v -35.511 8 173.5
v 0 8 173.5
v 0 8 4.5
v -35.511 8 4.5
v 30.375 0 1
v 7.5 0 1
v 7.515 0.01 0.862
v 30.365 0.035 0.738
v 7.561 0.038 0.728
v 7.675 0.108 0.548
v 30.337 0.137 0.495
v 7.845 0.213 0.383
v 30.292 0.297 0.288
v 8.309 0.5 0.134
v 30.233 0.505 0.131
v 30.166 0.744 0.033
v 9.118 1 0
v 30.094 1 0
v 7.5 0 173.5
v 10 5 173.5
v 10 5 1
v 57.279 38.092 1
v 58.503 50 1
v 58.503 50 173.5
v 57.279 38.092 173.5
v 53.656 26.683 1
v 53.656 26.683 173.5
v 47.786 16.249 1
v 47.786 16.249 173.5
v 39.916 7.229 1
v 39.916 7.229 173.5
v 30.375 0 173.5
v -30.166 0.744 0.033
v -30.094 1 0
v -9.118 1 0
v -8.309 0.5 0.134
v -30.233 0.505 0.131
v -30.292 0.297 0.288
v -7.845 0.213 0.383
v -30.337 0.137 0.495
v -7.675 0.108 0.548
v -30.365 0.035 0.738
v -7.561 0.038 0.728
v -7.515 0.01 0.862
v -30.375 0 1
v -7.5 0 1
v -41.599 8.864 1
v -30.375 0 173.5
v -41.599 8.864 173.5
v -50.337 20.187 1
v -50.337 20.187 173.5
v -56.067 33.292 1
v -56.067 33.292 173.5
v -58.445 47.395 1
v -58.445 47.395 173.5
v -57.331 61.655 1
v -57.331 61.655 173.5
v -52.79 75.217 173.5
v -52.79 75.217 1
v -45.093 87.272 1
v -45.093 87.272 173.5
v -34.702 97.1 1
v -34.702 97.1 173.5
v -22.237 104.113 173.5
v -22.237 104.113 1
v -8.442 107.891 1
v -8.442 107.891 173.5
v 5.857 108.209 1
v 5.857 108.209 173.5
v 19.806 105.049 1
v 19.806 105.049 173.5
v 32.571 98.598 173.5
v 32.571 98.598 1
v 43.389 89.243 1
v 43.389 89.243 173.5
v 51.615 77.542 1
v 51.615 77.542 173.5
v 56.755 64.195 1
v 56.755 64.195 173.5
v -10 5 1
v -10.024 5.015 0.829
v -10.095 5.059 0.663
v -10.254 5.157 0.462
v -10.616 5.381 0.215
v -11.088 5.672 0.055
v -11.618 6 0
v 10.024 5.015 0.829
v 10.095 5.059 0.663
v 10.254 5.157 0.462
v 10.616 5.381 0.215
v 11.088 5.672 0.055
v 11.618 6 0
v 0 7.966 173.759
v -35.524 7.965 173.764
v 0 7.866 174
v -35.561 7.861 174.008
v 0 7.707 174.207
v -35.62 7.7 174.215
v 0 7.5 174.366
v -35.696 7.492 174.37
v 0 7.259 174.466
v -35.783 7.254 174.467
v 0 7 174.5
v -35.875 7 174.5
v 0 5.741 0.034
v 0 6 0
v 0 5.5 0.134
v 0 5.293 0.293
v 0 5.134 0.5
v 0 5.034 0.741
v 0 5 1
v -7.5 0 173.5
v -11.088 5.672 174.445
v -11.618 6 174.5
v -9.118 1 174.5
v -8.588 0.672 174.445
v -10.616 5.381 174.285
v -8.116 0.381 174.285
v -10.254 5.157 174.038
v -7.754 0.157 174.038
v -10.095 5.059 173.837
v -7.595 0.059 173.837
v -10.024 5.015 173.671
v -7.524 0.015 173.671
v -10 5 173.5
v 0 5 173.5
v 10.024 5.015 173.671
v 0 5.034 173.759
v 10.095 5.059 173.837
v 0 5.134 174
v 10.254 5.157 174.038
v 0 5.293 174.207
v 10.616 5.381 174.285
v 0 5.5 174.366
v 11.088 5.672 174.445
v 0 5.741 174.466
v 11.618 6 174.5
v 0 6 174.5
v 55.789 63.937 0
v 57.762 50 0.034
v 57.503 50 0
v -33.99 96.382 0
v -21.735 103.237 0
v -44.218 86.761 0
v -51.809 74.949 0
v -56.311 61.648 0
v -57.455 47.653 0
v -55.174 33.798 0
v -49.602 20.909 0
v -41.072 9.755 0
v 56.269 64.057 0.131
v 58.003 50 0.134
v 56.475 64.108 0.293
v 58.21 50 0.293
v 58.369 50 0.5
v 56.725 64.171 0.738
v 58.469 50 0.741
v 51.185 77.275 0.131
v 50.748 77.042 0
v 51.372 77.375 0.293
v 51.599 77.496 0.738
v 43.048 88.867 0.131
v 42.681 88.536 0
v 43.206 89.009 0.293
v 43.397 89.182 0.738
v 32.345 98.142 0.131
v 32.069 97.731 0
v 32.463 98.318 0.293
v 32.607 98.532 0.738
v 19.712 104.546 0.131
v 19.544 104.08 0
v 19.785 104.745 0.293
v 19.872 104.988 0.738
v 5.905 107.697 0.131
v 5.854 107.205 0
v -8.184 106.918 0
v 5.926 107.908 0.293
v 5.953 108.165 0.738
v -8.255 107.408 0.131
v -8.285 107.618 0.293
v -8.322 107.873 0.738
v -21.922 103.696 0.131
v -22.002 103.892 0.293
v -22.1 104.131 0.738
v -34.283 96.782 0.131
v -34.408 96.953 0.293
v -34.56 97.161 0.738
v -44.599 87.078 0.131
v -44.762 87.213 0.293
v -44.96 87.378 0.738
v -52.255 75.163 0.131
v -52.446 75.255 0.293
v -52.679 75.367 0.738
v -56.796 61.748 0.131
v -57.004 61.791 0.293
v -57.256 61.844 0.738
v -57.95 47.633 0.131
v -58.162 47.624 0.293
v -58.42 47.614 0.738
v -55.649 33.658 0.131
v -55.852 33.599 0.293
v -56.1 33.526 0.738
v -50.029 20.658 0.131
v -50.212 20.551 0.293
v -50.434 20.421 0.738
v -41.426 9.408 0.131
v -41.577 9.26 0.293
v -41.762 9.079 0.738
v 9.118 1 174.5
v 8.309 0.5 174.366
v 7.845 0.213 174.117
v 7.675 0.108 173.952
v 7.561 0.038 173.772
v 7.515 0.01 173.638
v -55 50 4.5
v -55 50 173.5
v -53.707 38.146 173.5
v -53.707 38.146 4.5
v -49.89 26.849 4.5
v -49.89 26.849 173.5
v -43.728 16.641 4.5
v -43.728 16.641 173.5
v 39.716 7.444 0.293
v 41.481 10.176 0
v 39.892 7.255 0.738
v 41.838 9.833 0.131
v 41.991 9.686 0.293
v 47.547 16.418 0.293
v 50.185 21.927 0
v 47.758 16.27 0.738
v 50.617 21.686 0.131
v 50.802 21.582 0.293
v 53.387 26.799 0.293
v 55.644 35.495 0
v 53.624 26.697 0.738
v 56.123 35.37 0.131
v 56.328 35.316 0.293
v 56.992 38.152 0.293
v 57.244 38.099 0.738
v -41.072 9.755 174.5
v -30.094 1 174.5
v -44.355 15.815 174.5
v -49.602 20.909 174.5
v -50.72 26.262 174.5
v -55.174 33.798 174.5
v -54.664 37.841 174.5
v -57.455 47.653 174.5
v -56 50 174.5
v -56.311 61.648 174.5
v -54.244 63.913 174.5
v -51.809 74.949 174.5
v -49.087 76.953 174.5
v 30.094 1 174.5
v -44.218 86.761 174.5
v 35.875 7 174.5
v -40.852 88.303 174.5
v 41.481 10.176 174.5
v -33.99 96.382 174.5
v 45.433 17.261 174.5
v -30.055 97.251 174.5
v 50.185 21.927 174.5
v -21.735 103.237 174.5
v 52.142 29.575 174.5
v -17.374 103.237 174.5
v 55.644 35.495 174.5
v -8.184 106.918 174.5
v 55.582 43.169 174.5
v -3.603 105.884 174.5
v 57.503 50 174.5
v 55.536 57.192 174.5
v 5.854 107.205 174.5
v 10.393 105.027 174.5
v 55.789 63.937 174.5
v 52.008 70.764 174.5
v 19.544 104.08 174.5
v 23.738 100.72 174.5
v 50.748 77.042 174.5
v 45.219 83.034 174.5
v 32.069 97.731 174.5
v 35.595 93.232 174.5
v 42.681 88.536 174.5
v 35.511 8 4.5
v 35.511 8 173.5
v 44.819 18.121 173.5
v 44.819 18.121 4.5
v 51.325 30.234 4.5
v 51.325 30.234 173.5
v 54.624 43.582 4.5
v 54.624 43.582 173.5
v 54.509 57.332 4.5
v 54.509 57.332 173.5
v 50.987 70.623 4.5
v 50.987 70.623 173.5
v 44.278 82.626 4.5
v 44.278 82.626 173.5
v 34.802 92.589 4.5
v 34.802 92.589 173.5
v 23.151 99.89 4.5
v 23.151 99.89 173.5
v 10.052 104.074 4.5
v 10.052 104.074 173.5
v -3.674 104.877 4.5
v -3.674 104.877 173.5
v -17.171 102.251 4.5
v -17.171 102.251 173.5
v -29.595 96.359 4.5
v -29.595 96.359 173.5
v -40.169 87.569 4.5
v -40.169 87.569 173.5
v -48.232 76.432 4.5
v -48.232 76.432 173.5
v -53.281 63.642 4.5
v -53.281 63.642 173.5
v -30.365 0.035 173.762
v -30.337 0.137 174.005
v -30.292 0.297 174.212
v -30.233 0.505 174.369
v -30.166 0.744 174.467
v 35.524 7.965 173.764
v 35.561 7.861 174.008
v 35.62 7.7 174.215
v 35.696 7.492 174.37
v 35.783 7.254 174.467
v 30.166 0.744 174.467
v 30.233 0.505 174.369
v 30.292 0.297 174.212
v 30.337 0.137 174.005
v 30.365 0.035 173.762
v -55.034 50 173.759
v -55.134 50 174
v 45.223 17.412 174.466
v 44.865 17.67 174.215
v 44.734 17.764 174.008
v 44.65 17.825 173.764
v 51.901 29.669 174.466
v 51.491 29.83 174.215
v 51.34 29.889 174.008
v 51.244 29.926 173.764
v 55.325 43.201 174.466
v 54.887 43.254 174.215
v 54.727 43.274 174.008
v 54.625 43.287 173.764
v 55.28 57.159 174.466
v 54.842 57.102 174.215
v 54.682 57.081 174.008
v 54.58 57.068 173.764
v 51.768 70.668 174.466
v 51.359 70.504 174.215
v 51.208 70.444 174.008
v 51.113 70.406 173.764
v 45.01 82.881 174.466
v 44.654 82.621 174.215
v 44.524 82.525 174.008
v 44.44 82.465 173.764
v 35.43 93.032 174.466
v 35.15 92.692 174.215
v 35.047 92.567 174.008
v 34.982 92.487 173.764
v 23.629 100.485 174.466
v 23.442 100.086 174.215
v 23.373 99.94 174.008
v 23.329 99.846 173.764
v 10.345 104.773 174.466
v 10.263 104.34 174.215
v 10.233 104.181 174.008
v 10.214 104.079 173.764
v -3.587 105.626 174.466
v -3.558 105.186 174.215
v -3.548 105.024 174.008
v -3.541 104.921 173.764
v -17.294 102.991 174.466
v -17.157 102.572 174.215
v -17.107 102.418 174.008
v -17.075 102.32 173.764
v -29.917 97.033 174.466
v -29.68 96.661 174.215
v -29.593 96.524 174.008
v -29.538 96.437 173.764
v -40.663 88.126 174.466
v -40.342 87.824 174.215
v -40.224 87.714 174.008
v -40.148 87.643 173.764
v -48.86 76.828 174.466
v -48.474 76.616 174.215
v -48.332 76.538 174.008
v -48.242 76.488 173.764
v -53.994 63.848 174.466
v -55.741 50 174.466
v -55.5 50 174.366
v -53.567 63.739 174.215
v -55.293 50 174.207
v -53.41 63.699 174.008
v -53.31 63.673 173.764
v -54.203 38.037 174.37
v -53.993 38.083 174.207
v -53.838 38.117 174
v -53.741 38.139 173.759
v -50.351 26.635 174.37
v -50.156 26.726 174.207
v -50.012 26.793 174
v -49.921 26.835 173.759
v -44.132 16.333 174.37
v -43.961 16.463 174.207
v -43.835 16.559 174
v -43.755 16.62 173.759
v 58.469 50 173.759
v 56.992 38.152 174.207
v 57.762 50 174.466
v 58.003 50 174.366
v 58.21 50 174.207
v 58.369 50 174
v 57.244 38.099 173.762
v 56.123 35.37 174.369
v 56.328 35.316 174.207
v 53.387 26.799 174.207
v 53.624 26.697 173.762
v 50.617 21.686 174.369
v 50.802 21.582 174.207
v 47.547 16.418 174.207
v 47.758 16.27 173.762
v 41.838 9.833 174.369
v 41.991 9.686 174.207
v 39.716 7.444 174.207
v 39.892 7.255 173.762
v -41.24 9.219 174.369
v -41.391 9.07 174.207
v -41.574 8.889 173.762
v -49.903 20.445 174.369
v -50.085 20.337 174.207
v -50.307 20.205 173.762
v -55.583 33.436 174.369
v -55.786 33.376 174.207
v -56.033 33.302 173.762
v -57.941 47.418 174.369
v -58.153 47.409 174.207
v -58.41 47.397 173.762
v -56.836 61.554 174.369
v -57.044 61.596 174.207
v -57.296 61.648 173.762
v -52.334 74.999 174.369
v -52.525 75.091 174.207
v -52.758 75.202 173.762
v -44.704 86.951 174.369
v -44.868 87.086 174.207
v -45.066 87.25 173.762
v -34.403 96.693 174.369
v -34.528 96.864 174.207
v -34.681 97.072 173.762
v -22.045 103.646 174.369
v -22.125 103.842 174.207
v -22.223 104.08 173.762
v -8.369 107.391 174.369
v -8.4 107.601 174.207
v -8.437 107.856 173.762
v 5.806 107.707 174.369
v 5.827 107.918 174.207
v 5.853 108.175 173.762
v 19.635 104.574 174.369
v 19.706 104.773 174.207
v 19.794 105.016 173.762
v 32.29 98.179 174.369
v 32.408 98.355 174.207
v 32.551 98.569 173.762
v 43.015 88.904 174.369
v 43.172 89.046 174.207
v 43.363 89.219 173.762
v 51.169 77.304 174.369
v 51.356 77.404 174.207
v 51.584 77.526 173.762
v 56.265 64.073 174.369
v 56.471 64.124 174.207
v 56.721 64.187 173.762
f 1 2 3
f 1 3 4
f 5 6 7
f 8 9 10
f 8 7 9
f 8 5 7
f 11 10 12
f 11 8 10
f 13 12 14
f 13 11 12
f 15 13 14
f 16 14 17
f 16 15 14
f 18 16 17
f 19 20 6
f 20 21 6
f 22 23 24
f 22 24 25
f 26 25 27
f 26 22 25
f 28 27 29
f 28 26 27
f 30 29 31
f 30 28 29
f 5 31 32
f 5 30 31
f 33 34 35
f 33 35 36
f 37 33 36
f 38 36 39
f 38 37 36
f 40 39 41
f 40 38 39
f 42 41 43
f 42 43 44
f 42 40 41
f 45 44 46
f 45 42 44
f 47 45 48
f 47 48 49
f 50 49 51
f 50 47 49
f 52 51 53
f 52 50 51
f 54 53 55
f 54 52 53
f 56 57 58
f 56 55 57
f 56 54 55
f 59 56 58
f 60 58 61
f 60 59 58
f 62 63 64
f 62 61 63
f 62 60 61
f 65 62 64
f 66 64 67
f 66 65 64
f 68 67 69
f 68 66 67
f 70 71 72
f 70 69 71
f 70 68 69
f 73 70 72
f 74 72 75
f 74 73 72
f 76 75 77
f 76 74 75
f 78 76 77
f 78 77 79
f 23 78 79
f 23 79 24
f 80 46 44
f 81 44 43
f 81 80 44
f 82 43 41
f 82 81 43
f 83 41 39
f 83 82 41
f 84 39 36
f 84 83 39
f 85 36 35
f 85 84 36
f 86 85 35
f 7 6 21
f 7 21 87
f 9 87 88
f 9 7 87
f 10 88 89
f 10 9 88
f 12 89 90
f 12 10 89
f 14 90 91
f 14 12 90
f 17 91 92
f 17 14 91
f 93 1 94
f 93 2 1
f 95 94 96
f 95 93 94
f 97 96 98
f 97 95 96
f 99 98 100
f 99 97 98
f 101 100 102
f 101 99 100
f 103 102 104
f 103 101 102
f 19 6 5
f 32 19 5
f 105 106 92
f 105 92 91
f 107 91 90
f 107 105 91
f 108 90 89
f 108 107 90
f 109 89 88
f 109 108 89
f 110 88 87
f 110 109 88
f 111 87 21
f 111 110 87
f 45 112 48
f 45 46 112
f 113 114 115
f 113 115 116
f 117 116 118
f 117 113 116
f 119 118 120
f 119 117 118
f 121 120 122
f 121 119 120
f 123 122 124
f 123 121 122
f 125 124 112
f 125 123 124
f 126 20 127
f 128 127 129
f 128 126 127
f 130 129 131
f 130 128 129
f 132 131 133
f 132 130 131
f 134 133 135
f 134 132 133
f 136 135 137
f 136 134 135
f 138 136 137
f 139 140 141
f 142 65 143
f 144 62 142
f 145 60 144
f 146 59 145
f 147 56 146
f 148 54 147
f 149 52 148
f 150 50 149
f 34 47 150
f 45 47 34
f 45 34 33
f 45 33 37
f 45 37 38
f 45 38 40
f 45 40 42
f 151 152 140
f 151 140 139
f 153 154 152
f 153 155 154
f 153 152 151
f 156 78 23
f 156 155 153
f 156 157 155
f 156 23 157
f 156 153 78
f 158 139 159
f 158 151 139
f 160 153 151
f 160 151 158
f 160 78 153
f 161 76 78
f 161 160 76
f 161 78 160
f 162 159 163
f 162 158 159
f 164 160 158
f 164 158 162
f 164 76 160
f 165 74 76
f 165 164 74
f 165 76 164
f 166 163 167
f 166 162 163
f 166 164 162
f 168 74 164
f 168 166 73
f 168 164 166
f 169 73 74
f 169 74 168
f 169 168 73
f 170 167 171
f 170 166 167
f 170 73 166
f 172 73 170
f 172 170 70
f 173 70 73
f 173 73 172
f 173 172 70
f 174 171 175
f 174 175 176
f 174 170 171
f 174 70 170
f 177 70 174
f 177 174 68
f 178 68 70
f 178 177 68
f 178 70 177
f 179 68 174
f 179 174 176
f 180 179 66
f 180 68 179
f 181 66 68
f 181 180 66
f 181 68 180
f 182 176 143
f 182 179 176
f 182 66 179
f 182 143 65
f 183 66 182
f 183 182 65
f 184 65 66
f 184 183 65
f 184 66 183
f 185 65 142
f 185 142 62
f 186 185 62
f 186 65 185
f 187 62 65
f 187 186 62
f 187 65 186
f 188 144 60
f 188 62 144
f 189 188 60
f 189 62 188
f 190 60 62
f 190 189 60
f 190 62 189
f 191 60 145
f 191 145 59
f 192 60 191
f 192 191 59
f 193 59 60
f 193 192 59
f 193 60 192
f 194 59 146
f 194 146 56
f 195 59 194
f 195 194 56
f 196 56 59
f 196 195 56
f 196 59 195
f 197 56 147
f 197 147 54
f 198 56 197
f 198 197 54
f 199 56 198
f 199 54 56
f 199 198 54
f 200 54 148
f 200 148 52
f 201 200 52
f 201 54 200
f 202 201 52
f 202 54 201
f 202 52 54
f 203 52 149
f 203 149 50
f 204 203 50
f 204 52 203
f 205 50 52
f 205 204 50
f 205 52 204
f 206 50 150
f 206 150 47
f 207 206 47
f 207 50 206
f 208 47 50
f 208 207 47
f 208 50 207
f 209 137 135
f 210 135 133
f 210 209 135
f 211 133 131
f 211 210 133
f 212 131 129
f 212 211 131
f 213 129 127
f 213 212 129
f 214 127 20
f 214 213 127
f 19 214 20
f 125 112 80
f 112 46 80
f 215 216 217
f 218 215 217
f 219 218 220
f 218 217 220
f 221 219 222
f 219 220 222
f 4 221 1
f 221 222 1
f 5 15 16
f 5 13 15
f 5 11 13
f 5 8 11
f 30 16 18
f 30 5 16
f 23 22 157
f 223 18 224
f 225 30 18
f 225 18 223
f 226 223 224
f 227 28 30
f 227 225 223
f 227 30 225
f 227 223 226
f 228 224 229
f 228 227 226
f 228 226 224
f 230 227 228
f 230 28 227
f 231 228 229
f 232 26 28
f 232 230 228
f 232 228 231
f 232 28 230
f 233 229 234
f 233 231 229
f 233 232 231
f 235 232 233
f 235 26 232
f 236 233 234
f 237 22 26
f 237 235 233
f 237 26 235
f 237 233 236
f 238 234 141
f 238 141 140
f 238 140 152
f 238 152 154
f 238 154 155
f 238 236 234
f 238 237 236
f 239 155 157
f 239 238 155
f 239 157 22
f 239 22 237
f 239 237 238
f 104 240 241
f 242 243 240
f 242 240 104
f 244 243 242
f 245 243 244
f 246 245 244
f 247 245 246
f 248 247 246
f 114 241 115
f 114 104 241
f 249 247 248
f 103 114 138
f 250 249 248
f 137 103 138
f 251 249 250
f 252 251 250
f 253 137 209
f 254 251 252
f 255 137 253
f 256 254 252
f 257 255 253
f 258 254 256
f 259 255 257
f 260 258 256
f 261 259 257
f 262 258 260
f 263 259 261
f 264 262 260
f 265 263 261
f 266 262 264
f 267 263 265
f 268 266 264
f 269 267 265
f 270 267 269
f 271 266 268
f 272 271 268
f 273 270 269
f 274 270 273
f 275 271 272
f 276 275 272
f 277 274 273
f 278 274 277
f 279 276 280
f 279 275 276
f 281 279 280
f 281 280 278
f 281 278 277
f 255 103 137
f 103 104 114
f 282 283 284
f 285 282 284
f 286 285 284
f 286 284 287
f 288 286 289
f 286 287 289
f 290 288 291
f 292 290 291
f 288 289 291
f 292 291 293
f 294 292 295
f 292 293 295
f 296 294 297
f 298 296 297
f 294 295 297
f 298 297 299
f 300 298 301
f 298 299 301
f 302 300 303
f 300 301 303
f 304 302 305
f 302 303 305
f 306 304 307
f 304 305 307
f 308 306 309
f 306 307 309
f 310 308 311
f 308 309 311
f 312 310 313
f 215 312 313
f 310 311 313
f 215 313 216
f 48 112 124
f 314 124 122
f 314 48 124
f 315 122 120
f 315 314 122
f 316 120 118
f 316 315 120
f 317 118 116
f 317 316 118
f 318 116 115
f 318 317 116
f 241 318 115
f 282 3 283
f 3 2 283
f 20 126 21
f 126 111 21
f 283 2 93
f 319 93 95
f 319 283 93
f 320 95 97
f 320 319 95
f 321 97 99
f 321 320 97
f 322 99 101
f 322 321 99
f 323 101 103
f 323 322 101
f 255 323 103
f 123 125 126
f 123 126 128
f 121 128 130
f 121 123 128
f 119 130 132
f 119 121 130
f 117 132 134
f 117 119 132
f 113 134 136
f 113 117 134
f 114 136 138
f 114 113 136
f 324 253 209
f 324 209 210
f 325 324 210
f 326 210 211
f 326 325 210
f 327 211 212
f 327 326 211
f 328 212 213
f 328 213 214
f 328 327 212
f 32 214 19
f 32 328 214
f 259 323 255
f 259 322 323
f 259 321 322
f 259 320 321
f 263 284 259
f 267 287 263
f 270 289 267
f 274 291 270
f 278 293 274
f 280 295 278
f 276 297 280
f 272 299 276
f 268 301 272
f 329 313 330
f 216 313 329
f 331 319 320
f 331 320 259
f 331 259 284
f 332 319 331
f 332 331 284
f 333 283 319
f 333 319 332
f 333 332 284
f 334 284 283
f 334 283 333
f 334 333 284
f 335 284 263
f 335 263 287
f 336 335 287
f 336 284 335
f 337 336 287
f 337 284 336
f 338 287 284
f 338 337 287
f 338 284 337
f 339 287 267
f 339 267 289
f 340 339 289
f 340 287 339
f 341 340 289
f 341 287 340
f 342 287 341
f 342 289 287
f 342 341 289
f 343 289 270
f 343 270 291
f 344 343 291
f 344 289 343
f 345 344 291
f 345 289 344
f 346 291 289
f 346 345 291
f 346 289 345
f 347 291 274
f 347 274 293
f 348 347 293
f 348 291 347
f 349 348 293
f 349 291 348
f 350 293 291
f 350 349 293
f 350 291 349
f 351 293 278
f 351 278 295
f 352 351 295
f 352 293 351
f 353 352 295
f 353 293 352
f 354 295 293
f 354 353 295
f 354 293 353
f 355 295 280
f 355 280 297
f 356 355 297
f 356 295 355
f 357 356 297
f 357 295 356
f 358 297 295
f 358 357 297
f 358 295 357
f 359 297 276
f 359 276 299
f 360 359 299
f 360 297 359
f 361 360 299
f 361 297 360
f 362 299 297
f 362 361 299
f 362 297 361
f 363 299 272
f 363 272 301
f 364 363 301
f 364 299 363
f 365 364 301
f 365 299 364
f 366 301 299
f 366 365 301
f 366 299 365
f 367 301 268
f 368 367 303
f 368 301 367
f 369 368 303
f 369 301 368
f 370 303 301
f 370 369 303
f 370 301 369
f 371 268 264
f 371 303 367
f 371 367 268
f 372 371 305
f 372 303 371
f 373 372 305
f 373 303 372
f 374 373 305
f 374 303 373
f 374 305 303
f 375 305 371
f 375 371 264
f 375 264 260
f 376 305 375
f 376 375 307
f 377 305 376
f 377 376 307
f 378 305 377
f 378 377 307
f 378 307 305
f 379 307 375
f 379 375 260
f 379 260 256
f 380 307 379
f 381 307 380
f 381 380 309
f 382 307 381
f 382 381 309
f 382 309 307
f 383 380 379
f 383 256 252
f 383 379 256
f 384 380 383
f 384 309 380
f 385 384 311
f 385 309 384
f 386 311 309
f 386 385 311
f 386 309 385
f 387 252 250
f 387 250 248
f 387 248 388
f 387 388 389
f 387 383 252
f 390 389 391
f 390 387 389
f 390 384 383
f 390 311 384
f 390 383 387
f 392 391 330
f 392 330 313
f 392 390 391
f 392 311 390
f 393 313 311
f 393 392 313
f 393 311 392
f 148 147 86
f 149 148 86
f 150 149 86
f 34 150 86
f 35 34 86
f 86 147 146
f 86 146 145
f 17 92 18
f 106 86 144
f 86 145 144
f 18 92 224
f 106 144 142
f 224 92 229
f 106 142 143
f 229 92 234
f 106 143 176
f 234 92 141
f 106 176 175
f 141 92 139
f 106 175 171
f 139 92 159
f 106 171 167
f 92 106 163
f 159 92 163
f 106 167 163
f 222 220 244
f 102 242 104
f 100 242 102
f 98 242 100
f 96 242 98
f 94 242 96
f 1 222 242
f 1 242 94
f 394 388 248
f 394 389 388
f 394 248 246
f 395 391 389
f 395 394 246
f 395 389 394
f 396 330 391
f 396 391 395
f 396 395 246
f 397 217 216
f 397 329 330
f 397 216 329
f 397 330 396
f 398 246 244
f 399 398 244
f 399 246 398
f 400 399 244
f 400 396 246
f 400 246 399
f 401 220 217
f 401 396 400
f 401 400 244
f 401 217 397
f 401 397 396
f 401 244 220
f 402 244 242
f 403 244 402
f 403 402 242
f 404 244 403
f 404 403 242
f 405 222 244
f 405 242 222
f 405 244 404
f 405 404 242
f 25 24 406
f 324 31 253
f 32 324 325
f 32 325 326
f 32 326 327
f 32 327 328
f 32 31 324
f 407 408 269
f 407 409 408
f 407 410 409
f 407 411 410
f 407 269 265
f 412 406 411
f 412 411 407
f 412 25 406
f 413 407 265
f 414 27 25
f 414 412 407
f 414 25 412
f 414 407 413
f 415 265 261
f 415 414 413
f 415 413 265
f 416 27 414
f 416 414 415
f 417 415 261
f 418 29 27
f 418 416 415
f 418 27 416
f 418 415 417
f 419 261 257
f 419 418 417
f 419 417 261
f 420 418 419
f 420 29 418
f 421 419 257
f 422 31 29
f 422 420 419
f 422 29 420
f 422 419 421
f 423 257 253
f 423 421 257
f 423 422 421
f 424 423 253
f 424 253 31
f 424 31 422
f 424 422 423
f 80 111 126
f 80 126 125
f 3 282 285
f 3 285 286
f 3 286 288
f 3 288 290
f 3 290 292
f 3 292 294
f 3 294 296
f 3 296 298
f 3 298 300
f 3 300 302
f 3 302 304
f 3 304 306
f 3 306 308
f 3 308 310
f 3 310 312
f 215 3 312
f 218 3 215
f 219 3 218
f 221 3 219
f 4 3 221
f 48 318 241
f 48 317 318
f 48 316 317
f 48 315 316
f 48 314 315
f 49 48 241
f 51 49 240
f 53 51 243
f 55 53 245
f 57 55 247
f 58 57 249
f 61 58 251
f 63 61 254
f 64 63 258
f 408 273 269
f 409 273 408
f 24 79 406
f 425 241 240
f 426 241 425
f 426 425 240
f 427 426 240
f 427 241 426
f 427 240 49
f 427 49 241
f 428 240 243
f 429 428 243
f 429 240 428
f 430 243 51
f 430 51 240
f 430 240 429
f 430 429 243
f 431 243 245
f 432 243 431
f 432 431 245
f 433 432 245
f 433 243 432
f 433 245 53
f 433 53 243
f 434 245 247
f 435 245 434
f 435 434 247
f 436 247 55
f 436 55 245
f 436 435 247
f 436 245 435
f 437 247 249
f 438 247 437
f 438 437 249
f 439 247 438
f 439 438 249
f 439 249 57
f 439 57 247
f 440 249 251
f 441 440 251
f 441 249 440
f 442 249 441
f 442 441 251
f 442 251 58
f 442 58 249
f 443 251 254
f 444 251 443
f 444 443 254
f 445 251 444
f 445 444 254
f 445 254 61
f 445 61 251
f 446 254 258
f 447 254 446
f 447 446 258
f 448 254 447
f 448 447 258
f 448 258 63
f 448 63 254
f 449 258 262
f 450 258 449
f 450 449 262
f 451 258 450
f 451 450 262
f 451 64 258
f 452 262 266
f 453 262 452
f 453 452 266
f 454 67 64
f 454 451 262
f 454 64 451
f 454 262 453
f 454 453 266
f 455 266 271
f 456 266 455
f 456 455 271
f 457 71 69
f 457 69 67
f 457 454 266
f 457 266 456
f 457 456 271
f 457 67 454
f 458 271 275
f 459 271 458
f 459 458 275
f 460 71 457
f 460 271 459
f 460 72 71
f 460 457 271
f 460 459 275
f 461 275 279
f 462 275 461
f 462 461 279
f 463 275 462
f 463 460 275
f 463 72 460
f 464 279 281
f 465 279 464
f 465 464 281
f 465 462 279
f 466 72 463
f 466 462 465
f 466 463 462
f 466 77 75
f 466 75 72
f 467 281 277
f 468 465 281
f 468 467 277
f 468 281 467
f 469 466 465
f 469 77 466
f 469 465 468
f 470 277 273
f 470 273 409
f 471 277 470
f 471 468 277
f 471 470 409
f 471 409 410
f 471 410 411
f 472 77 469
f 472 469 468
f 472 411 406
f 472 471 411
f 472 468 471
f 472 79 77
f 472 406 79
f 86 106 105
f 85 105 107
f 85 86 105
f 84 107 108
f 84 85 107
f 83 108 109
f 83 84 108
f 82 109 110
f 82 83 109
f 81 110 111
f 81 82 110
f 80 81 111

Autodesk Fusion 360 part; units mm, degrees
sketch "Sketch1" plane through (0, 0, 0) normal (0, 0, 1) x (1, 0, 0)
  line L0 (0, 5) -> (10, 5)
  line L1 (0, 5) -> (-10, 5)
  line L2 (-7.5, 0) -> (-10, 5)
  line L3 (10, 5) -> (7.5, 0)
  line L4 (-7.5, 0) -> (-30.375, 0)
  line L5 (7.5, 0) -> (30.375, 0)
  line L6 (0, 0) -> (0, 50)
  circle A0 centre (0, 50) radius 58.5033
extrude "Extrude1" add sketch "Sketch1" along normal blind 174.5 contours L0 L1 L2 L3 L4 L5 A0 picked at (-15.3089, 35.3909)
sketch "Sketch2" plane through (0, 0, 174.5) normal (0, 0, 1) x (-1, 0, 0)
  line L0 (10, -5) -> (-10, -5)
  line L1 (-10, -5) -> (-7.5, 0)
  line L2 (-7.5, 0) -> (-30.375, 0)
  arc A0 (-30.375, 0) -> (30.375, 0) centre (0, -50) ccw
  line L3 (30.375, 0) -> (7.5, 0)
  line L4 (7.5, 0) -> (10, -5)
  circle A1 centre (0, -50) radius 55
  line L5 (0, -5) -> (0, -8)
  line L6 (0, -8) -> (-35.5106, -8)
  line L7 (0, -8) -> (35.5106, -8)
  dimension "d10" = 3
extrude "Extrude2" cut sketch "Sketch2" against normal blind 170 contours A1 L6 L7
fillet "Fillet1" radius 1 1 faces at (25.2952, 4.3333, 174.5)
fillet "Fillet2" radius 1 1 faces at (-15.3089, 35.3909, 0)
sketch "Sketch3" plane through (0, 0, 0) normal (0, 0, 1) x (1, 0, 0)
  line L0 (-30, 0) -> (30, 0)
  circle A0 centre (0, 50) radius 58.3095
